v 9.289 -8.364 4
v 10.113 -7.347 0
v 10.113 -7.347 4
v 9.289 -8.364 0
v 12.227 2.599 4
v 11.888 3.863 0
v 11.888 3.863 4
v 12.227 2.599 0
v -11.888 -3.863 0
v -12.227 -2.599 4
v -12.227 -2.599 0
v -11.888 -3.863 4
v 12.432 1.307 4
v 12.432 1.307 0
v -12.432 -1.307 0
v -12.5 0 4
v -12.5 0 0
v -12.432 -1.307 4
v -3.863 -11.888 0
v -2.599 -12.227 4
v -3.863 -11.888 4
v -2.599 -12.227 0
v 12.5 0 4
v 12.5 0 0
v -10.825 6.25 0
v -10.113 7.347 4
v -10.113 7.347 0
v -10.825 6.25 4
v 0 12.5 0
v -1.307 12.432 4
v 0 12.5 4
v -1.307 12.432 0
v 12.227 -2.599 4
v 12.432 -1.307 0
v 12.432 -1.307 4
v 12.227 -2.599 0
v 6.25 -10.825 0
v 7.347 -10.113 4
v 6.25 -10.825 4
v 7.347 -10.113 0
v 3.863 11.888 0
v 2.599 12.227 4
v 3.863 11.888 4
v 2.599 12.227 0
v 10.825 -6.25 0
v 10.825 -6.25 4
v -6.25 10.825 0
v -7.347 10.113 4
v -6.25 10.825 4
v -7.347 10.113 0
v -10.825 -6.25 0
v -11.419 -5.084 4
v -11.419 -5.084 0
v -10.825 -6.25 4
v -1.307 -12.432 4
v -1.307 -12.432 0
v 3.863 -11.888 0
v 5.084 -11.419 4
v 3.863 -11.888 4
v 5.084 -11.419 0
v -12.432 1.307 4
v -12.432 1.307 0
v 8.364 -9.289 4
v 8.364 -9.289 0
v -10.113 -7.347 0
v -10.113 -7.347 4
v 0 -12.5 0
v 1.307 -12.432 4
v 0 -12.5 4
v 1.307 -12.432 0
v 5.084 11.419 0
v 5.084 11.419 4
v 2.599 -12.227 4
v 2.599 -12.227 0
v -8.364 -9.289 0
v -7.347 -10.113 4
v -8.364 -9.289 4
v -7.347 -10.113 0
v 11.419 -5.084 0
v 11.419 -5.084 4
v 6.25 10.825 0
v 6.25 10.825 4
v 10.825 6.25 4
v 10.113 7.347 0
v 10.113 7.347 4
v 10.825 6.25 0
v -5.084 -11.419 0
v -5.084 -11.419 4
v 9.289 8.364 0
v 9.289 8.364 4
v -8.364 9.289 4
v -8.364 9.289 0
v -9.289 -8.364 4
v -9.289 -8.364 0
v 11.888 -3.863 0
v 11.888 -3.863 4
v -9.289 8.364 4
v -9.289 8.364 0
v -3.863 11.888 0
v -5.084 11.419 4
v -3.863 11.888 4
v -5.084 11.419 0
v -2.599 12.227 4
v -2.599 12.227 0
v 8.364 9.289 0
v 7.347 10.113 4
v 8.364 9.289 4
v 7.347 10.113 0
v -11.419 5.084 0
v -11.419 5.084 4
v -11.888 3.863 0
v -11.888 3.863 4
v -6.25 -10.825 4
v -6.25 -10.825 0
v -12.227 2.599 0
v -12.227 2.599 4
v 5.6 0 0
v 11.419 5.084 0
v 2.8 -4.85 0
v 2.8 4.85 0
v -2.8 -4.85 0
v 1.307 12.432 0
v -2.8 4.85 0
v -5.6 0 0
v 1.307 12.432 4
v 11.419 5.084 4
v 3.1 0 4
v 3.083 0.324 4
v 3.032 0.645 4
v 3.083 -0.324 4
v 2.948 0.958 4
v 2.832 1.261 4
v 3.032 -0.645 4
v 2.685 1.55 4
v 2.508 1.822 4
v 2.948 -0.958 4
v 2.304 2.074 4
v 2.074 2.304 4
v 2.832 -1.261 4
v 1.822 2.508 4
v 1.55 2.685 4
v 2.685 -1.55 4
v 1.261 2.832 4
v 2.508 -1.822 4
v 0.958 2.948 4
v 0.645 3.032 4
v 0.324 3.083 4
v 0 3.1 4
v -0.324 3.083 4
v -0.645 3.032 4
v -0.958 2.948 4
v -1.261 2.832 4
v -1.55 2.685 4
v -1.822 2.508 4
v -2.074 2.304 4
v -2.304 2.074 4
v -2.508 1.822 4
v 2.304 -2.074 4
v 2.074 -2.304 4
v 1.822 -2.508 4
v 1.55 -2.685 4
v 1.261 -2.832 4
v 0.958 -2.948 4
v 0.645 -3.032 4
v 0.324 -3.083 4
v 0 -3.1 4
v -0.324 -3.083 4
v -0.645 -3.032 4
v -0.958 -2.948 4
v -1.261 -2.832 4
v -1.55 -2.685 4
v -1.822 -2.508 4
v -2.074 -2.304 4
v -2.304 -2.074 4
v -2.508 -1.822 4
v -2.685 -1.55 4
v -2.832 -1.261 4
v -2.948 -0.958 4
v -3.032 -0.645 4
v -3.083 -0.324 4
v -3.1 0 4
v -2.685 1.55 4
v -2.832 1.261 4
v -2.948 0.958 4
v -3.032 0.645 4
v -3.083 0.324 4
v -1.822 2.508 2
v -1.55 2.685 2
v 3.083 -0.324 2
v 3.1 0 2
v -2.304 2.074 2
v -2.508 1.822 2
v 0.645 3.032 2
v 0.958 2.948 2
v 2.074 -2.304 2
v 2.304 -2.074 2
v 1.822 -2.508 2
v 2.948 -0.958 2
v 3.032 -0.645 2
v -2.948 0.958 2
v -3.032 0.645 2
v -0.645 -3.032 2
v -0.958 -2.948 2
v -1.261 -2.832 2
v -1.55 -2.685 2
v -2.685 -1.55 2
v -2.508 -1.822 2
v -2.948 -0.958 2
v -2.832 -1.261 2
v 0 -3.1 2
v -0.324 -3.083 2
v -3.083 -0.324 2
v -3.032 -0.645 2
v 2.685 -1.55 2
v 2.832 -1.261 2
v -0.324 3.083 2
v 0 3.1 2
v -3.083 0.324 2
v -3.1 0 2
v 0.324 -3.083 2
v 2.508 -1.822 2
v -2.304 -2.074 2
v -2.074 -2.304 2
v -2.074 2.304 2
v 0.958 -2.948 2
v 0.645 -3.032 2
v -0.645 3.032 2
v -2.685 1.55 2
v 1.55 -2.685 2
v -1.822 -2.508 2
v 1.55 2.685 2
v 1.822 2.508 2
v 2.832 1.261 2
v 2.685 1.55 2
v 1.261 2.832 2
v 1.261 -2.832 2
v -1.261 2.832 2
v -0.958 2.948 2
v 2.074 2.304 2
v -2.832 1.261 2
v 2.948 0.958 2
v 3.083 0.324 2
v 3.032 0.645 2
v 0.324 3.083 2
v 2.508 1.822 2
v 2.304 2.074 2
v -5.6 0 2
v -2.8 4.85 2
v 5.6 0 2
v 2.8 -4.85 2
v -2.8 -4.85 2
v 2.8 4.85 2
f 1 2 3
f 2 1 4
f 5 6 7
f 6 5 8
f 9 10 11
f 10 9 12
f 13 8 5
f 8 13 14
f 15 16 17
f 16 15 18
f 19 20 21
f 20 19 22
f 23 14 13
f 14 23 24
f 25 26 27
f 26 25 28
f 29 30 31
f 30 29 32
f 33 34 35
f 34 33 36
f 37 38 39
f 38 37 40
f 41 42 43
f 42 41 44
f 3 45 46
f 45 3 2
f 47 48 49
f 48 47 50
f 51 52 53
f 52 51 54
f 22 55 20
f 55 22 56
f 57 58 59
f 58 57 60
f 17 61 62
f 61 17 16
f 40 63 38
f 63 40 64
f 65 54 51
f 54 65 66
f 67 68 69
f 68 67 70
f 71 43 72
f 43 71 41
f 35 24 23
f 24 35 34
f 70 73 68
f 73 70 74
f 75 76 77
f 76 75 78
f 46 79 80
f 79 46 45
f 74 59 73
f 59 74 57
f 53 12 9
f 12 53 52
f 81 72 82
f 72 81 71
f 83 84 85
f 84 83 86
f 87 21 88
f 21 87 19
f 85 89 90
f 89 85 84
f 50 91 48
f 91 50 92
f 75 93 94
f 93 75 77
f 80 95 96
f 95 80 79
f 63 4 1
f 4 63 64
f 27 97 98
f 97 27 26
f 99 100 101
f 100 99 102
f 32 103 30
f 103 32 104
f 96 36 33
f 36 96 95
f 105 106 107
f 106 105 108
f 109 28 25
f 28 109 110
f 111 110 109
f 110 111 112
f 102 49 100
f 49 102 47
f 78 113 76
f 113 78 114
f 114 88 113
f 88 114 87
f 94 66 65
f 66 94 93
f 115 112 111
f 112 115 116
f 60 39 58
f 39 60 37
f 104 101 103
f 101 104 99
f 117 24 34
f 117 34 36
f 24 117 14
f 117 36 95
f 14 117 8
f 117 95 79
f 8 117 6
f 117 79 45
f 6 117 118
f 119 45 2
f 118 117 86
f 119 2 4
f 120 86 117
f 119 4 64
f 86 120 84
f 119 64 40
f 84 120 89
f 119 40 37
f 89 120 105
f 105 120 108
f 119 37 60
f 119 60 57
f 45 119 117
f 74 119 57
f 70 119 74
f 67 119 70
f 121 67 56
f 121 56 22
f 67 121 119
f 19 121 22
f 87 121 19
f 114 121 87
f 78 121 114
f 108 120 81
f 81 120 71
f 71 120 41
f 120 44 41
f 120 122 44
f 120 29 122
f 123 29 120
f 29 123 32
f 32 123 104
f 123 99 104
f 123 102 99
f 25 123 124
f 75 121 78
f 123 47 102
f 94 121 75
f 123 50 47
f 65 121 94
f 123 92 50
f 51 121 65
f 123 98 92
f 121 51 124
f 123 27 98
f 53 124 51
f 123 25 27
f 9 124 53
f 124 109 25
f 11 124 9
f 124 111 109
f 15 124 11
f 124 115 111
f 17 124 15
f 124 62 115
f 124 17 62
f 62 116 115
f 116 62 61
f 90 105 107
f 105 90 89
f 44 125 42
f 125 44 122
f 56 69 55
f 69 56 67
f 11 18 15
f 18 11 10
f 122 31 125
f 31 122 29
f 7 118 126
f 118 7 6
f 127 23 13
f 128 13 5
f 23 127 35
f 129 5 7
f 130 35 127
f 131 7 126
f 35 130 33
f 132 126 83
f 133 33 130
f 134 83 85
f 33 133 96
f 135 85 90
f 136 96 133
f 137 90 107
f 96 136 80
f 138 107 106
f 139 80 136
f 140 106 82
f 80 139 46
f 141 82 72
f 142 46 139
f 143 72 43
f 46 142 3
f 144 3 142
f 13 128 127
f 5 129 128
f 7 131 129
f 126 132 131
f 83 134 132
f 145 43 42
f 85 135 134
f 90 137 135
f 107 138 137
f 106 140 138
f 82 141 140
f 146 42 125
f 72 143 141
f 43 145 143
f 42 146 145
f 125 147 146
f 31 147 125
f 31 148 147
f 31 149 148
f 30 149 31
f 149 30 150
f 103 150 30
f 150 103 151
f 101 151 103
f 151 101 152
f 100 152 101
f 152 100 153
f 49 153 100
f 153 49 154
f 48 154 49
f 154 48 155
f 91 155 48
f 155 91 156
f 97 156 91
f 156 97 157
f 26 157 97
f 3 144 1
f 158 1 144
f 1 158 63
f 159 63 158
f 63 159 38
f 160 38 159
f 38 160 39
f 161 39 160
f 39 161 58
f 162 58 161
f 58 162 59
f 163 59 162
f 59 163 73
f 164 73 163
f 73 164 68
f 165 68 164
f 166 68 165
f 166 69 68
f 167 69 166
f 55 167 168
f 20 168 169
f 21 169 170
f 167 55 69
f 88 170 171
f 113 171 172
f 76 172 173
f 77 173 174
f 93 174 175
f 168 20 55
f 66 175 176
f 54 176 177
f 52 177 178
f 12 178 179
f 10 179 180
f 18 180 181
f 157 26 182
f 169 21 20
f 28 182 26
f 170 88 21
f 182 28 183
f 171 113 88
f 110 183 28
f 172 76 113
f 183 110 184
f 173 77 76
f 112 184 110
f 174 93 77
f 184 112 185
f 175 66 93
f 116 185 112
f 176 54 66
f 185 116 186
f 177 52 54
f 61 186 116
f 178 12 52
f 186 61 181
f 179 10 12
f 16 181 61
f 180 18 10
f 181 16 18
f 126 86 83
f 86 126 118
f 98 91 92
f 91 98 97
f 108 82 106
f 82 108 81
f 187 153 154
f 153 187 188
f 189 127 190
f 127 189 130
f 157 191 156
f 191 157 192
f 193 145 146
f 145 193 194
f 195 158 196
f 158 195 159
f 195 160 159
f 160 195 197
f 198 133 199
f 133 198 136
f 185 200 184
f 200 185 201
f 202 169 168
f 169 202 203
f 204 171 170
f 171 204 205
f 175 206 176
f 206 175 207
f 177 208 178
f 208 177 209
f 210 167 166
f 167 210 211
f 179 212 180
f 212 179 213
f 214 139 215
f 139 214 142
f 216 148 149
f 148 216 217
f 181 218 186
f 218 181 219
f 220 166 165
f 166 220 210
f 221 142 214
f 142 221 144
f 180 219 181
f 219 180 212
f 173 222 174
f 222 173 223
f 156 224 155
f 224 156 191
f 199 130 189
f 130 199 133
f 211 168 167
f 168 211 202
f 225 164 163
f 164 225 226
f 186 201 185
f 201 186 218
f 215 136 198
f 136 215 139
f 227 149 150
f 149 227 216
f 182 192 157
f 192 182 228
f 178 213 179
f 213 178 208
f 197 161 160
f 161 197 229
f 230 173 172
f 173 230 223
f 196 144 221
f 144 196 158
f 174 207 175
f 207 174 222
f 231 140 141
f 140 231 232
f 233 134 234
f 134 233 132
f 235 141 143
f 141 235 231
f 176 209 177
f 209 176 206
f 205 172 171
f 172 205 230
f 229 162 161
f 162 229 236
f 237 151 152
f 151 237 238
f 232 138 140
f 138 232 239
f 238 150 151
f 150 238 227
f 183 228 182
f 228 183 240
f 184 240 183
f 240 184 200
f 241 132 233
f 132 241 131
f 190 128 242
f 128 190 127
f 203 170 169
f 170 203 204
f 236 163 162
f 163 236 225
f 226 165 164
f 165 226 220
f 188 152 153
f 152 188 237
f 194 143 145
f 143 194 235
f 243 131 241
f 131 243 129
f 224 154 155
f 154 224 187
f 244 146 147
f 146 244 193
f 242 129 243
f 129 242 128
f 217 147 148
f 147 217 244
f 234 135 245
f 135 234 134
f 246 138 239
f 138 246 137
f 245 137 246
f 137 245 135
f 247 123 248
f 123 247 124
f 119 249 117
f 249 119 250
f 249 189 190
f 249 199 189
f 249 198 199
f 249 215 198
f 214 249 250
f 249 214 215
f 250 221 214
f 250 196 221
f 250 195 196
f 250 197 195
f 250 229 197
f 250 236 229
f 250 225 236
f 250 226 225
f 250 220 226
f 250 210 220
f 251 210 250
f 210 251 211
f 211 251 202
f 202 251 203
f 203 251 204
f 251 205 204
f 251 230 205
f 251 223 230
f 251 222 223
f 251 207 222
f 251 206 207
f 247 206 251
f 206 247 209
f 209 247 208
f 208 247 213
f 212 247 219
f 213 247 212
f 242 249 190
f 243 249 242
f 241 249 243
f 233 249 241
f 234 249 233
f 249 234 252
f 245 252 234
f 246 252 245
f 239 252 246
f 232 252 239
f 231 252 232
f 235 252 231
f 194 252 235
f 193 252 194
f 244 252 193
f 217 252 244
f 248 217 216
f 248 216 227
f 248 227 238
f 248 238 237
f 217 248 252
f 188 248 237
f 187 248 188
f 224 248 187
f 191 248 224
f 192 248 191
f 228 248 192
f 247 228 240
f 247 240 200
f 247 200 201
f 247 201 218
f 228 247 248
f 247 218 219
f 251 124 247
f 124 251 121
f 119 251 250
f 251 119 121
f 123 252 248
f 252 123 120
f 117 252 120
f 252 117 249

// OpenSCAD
!front_hex_hub_fastner($fn=60);
translate([0,0,4.2]) front_hex_hub($fn=60);



module front_hex_hub() {
    
    difference() {
        
        // hub body
        union () {
            linear_extrude(6) circle(d=18);
            translate([0,0,6]) linear_extrude(12) circle(d=27.7, $fn=6); // calculate circumradius.
            translate([0,0,6+12]) linear_extrude(1) circle(d=15.5);
            translate([0,0,6+12+1]) linear_extrude(16) circle(d=12);
        }
        
        // center hole
        linear_extrude(6+12+1+16-4) circle(d=6.2); 
        translate([0,0,6+12+1+16-4]) linear_extrude(5) square(6, true);
    }
}


module front_hex_hub_fastner() {
    difference() {
        linear_extrude(4) circle(d=25);
        linear_extrude(4) circle(d=6.2);
        linear_extrude(2) circle(d=11.2, $fn=6);
    }
}
